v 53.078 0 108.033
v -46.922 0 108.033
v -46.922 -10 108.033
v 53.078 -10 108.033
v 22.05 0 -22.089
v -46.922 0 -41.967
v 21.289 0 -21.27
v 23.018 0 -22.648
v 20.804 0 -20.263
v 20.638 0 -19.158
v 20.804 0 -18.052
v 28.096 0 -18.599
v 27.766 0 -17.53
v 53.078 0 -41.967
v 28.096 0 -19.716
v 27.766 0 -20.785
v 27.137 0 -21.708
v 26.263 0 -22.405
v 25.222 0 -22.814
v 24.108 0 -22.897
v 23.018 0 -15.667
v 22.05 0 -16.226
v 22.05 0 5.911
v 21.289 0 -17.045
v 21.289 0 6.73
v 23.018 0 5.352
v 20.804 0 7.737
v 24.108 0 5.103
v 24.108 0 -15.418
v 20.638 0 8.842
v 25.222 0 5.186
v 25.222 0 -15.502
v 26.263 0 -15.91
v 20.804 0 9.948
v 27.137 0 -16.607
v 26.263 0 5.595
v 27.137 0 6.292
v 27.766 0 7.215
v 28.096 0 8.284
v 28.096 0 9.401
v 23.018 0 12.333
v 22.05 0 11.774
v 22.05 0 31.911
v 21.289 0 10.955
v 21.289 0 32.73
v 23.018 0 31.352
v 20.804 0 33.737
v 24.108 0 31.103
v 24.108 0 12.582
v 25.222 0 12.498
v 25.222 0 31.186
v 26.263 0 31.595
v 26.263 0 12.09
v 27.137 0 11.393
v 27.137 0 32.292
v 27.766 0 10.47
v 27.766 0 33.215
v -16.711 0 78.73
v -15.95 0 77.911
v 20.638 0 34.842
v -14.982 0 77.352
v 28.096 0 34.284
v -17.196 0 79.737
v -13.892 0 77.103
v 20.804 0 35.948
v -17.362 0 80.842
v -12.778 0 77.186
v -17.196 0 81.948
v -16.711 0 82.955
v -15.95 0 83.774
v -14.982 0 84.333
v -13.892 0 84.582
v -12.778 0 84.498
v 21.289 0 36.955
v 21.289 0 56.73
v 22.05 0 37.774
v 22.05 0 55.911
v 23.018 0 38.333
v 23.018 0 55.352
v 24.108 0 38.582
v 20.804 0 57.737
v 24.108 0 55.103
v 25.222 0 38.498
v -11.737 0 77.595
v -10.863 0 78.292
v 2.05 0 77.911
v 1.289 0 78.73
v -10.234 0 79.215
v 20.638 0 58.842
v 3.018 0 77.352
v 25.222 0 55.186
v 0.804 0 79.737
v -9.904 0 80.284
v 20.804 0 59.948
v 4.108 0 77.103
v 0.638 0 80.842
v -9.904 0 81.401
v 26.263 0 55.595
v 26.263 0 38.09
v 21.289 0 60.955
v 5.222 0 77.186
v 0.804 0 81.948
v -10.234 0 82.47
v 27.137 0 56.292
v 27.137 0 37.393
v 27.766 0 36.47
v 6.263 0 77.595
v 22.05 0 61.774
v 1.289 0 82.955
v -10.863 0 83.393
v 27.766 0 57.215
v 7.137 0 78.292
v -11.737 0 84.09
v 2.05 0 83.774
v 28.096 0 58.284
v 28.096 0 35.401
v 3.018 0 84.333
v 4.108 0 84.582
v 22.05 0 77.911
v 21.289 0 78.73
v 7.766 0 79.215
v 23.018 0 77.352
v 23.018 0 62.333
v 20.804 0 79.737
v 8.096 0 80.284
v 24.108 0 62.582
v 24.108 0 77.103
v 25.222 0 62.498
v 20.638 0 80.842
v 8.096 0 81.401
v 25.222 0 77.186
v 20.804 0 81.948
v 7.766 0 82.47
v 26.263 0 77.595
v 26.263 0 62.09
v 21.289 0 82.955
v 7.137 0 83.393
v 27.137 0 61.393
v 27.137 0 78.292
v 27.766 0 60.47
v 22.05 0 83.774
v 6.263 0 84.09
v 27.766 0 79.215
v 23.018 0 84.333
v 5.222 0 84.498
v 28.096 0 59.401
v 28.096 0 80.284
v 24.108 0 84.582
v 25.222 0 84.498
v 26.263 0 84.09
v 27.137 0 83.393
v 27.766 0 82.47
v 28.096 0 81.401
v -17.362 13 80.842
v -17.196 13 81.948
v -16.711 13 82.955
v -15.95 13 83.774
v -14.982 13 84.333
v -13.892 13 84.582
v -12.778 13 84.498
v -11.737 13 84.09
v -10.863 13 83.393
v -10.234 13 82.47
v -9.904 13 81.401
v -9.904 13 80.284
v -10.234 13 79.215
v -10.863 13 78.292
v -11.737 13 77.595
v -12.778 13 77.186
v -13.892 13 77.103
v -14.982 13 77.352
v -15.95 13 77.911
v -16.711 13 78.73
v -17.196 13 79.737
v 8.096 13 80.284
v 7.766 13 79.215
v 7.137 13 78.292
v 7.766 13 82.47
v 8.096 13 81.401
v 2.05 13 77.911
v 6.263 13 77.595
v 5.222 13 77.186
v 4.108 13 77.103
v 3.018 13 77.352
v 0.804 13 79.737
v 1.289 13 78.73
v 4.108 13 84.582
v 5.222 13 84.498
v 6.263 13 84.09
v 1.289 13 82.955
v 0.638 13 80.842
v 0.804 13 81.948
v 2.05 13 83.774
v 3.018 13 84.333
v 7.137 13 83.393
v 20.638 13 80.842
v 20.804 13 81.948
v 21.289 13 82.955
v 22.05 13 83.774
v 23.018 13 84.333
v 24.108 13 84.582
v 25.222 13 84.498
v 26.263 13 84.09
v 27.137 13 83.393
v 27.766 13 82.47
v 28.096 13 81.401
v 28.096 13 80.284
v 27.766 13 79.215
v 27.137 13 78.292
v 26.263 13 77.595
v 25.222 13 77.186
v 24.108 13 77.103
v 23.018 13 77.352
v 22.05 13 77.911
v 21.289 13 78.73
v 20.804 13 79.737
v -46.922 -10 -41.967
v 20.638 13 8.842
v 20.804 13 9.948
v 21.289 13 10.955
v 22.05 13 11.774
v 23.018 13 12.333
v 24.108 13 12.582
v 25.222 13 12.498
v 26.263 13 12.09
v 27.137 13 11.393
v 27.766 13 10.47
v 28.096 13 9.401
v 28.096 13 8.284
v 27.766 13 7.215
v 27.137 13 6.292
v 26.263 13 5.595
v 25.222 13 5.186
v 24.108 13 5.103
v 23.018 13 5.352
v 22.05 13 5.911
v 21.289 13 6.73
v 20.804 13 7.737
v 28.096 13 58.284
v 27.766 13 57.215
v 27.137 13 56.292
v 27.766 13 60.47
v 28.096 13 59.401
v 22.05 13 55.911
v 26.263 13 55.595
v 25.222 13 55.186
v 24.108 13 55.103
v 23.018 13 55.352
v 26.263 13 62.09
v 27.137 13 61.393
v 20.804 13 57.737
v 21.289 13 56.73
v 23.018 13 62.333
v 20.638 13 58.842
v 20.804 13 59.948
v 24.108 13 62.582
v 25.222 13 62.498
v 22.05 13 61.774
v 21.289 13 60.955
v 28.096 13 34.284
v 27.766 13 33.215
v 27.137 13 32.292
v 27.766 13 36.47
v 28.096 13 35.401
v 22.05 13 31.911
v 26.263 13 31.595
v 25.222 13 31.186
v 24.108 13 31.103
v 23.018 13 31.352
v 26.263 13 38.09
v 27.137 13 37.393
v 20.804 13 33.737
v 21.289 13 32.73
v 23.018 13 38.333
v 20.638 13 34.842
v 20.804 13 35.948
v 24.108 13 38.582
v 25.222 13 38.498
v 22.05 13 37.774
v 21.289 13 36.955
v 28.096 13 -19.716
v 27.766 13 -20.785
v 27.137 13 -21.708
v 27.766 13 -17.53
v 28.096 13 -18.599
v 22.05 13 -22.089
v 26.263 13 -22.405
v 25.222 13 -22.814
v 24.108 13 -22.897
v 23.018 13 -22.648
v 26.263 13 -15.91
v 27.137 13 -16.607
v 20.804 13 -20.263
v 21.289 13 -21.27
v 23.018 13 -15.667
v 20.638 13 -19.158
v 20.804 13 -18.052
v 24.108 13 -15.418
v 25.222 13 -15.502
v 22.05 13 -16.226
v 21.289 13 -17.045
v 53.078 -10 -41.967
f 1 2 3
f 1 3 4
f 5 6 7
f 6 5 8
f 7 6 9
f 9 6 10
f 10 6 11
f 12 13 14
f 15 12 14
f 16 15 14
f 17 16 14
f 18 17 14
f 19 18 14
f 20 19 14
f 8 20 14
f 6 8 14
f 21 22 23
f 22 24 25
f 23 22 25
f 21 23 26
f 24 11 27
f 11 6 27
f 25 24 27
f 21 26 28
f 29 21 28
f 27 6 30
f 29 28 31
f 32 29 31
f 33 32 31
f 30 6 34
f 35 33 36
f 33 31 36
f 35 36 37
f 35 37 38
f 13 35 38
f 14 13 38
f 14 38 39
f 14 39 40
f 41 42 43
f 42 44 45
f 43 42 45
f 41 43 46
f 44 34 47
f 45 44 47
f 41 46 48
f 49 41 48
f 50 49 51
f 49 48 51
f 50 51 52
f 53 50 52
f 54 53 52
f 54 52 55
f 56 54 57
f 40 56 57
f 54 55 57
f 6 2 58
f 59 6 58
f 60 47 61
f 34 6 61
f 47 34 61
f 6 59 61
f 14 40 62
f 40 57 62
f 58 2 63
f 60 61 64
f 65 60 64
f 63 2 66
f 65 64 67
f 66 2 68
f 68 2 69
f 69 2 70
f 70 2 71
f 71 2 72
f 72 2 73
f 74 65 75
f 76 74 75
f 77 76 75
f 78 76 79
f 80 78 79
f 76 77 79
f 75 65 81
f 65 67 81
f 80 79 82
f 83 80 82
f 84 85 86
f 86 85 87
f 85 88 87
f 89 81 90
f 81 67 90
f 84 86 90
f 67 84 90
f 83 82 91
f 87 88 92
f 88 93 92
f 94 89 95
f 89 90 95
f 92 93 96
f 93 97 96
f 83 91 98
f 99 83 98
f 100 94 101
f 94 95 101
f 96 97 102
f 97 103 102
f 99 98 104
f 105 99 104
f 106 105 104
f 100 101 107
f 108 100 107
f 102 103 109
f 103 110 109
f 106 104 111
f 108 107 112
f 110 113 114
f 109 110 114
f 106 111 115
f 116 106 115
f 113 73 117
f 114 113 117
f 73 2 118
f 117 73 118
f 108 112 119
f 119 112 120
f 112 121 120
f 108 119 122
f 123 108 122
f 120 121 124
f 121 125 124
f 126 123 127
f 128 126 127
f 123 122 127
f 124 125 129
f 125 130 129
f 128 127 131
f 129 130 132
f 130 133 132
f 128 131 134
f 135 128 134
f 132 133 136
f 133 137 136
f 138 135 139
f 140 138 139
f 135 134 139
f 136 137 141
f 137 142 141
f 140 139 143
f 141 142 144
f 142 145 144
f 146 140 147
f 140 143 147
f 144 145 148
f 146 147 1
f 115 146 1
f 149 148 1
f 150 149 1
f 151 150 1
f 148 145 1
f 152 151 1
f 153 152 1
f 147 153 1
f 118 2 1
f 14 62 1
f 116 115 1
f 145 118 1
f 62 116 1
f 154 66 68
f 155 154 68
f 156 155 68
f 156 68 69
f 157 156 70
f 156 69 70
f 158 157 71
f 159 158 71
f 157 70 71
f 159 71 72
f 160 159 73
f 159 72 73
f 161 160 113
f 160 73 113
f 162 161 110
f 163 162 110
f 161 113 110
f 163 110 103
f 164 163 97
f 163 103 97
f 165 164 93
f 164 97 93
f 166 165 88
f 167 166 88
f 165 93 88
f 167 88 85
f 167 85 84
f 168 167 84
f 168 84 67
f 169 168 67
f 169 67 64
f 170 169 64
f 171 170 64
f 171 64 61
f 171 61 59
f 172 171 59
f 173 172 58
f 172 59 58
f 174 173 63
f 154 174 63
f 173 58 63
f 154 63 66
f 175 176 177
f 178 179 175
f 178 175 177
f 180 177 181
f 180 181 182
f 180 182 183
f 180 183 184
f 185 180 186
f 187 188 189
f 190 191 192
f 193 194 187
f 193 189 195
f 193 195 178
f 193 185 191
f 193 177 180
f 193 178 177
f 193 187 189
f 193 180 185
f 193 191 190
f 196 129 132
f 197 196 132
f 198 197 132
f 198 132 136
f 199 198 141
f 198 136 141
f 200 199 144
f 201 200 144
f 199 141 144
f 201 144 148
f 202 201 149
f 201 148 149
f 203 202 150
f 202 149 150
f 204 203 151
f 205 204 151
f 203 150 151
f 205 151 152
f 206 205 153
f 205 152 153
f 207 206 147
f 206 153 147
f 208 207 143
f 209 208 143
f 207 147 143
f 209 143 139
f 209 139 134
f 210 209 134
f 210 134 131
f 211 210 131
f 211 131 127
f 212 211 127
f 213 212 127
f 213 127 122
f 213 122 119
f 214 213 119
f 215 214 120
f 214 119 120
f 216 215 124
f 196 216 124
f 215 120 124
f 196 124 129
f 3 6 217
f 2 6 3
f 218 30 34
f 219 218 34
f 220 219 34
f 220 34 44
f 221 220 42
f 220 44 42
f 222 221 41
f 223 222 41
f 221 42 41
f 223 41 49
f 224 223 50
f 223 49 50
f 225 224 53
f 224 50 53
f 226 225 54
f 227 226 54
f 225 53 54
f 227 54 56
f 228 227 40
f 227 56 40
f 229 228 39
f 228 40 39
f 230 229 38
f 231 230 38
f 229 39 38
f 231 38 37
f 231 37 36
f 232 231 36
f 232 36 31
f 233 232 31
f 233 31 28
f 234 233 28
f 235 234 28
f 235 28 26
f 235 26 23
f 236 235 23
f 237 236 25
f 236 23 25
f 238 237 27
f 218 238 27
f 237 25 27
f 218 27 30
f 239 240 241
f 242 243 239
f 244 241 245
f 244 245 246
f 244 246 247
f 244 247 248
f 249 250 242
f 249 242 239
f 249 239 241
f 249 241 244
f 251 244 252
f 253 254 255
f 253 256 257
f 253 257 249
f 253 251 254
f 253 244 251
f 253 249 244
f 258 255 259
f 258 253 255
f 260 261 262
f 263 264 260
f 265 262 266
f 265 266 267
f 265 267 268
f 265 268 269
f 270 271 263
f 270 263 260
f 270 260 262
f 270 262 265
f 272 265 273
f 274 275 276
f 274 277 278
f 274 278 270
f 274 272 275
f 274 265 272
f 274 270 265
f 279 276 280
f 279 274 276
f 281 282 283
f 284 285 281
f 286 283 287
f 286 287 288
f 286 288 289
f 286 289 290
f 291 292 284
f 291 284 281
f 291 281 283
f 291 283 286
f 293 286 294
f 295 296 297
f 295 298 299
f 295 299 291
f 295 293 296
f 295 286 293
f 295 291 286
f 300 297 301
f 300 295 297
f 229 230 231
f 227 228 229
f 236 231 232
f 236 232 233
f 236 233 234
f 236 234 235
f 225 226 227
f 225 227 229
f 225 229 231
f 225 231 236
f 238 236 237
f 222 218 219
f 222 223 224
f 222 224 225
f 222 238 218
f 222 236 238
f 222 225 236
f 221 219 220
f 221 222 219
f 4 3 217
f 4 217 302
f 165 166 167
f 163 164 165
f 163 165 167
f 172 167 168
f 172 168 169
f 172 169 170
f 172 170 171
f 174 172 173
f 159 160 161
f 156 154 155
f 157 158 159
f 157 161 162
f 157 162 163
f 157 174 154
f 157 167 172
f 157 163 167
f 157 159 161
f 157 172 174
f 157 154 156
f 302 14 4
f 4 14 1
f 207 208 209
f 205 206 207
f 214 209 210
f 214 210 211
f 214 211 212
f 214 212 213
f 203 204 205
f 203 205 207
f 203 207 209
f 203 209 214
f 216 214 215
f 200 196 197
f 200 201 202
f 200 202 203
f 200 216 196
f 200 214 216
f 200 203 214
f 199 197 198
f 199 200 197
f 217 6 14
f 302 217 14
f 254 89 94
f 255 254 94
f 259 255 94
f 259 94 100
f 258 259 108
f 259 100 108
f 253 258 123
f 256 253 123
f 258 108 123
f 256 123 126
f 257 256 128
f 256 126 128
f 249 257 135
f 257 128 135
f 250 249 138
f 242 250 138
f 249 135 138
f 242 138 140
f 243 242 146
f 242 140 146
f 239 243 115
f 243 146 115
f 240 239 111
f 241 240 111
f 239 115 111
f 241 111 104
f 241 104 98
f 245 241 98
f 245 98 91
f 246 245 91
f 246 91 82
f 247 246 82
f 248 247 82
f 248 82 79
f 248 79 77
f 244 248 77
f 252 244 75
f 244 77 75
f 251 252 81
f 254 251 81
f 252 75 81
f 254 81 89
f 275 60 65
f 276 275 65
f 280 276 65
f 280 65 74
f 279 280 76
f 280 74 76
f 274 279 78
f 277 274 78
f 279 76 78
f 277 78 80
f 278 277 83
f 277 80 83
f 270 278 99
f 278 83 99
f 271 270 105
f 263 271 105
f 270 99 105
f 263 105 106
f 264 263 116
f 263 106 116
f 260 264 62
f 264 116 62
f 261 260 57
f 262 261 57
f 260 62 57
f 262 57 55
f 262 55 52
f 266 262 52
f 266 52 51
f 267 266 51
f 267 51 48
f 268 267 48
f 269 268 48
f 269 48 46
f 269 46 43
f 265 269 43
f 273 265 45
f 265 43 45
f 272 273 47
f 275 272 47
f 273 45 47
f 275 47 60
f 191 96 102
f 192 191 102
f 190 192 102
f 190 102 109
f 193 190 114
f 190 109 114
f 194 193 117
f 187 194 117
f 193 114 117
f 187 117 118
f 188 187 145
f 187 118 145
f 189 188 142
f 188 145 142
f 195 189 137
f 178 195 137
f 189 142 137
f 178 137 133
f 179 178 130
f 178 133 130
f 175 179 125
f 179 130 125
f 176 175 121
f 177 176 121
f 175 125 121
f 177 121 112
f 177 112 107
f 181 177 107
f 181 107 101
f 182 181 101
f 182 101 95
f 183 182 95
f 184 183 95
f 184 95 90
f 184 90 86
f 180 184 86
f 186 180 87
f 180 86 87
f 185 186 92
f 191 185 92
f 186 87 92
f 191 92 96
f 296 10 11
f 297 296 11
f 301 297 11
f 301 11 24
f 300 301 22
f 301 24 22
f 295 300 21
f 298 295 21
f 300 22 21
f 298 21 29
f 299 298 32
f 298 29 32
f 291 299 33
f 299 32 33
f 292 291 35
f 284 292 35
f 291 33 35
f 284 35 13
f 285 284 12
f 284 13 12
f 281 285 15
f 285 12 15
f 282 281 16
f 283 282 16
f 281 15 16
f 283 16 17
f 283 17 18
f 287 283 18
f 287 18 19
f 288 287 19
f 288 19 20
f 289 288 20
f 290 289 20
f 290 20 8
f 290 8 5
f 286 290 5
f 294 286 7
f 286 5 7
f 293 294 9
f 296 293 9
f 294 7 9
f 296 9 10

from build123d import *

# Parameters (mm, degrees)
F0_W     = 100
F0_H     = 150
F1_DEPTH = 10
F2_R     = 3.75
F3_DEPTH = 13


# Not quite as in the source:
# - a feature names something its author has since deleted; it is built from what else it names


with BuildPart() as f1:
    # F0 (on Front) → F1 (new body)
    with BuildSketch(Plane.XZ):
        with Locations((3.0784979463, 33.0328063236)):
            Rectangle(F0_W, F0_H)
    extrude(amount=F1_DEPTH)

    # F2 (on face) → F3 (join)
    with BuildSketch(Plane(origin=(0, 0, 0), x_dir=(-1, 0, 0), z_dir=(0, 1, 0))):
        with Locations((13.6121616811, 80.8424673975)):
            Circle(F2_R)
        with Locations((-4.3878383189, 80.8424673975)):
            Circle(F2_R)
        with Locations((-24.3878383189, 80.8424673975)):
            Circle(F2_R)
        with Locations((-24.3878383189, 58.8424673975)):
            Circle(F2_R)
        with Locations((-24.3878383189, 34.8424673975)):
            Circle(F2_R)
        with Locations((-24.3878383189, 8.8424673975)):
            Circle(F2_R)
        with Locations((-24.3878383189, -19.1575326025)):
            Circle(F2_R)
    extrude(amount=F3_DEPTH)


solid = f1.part
